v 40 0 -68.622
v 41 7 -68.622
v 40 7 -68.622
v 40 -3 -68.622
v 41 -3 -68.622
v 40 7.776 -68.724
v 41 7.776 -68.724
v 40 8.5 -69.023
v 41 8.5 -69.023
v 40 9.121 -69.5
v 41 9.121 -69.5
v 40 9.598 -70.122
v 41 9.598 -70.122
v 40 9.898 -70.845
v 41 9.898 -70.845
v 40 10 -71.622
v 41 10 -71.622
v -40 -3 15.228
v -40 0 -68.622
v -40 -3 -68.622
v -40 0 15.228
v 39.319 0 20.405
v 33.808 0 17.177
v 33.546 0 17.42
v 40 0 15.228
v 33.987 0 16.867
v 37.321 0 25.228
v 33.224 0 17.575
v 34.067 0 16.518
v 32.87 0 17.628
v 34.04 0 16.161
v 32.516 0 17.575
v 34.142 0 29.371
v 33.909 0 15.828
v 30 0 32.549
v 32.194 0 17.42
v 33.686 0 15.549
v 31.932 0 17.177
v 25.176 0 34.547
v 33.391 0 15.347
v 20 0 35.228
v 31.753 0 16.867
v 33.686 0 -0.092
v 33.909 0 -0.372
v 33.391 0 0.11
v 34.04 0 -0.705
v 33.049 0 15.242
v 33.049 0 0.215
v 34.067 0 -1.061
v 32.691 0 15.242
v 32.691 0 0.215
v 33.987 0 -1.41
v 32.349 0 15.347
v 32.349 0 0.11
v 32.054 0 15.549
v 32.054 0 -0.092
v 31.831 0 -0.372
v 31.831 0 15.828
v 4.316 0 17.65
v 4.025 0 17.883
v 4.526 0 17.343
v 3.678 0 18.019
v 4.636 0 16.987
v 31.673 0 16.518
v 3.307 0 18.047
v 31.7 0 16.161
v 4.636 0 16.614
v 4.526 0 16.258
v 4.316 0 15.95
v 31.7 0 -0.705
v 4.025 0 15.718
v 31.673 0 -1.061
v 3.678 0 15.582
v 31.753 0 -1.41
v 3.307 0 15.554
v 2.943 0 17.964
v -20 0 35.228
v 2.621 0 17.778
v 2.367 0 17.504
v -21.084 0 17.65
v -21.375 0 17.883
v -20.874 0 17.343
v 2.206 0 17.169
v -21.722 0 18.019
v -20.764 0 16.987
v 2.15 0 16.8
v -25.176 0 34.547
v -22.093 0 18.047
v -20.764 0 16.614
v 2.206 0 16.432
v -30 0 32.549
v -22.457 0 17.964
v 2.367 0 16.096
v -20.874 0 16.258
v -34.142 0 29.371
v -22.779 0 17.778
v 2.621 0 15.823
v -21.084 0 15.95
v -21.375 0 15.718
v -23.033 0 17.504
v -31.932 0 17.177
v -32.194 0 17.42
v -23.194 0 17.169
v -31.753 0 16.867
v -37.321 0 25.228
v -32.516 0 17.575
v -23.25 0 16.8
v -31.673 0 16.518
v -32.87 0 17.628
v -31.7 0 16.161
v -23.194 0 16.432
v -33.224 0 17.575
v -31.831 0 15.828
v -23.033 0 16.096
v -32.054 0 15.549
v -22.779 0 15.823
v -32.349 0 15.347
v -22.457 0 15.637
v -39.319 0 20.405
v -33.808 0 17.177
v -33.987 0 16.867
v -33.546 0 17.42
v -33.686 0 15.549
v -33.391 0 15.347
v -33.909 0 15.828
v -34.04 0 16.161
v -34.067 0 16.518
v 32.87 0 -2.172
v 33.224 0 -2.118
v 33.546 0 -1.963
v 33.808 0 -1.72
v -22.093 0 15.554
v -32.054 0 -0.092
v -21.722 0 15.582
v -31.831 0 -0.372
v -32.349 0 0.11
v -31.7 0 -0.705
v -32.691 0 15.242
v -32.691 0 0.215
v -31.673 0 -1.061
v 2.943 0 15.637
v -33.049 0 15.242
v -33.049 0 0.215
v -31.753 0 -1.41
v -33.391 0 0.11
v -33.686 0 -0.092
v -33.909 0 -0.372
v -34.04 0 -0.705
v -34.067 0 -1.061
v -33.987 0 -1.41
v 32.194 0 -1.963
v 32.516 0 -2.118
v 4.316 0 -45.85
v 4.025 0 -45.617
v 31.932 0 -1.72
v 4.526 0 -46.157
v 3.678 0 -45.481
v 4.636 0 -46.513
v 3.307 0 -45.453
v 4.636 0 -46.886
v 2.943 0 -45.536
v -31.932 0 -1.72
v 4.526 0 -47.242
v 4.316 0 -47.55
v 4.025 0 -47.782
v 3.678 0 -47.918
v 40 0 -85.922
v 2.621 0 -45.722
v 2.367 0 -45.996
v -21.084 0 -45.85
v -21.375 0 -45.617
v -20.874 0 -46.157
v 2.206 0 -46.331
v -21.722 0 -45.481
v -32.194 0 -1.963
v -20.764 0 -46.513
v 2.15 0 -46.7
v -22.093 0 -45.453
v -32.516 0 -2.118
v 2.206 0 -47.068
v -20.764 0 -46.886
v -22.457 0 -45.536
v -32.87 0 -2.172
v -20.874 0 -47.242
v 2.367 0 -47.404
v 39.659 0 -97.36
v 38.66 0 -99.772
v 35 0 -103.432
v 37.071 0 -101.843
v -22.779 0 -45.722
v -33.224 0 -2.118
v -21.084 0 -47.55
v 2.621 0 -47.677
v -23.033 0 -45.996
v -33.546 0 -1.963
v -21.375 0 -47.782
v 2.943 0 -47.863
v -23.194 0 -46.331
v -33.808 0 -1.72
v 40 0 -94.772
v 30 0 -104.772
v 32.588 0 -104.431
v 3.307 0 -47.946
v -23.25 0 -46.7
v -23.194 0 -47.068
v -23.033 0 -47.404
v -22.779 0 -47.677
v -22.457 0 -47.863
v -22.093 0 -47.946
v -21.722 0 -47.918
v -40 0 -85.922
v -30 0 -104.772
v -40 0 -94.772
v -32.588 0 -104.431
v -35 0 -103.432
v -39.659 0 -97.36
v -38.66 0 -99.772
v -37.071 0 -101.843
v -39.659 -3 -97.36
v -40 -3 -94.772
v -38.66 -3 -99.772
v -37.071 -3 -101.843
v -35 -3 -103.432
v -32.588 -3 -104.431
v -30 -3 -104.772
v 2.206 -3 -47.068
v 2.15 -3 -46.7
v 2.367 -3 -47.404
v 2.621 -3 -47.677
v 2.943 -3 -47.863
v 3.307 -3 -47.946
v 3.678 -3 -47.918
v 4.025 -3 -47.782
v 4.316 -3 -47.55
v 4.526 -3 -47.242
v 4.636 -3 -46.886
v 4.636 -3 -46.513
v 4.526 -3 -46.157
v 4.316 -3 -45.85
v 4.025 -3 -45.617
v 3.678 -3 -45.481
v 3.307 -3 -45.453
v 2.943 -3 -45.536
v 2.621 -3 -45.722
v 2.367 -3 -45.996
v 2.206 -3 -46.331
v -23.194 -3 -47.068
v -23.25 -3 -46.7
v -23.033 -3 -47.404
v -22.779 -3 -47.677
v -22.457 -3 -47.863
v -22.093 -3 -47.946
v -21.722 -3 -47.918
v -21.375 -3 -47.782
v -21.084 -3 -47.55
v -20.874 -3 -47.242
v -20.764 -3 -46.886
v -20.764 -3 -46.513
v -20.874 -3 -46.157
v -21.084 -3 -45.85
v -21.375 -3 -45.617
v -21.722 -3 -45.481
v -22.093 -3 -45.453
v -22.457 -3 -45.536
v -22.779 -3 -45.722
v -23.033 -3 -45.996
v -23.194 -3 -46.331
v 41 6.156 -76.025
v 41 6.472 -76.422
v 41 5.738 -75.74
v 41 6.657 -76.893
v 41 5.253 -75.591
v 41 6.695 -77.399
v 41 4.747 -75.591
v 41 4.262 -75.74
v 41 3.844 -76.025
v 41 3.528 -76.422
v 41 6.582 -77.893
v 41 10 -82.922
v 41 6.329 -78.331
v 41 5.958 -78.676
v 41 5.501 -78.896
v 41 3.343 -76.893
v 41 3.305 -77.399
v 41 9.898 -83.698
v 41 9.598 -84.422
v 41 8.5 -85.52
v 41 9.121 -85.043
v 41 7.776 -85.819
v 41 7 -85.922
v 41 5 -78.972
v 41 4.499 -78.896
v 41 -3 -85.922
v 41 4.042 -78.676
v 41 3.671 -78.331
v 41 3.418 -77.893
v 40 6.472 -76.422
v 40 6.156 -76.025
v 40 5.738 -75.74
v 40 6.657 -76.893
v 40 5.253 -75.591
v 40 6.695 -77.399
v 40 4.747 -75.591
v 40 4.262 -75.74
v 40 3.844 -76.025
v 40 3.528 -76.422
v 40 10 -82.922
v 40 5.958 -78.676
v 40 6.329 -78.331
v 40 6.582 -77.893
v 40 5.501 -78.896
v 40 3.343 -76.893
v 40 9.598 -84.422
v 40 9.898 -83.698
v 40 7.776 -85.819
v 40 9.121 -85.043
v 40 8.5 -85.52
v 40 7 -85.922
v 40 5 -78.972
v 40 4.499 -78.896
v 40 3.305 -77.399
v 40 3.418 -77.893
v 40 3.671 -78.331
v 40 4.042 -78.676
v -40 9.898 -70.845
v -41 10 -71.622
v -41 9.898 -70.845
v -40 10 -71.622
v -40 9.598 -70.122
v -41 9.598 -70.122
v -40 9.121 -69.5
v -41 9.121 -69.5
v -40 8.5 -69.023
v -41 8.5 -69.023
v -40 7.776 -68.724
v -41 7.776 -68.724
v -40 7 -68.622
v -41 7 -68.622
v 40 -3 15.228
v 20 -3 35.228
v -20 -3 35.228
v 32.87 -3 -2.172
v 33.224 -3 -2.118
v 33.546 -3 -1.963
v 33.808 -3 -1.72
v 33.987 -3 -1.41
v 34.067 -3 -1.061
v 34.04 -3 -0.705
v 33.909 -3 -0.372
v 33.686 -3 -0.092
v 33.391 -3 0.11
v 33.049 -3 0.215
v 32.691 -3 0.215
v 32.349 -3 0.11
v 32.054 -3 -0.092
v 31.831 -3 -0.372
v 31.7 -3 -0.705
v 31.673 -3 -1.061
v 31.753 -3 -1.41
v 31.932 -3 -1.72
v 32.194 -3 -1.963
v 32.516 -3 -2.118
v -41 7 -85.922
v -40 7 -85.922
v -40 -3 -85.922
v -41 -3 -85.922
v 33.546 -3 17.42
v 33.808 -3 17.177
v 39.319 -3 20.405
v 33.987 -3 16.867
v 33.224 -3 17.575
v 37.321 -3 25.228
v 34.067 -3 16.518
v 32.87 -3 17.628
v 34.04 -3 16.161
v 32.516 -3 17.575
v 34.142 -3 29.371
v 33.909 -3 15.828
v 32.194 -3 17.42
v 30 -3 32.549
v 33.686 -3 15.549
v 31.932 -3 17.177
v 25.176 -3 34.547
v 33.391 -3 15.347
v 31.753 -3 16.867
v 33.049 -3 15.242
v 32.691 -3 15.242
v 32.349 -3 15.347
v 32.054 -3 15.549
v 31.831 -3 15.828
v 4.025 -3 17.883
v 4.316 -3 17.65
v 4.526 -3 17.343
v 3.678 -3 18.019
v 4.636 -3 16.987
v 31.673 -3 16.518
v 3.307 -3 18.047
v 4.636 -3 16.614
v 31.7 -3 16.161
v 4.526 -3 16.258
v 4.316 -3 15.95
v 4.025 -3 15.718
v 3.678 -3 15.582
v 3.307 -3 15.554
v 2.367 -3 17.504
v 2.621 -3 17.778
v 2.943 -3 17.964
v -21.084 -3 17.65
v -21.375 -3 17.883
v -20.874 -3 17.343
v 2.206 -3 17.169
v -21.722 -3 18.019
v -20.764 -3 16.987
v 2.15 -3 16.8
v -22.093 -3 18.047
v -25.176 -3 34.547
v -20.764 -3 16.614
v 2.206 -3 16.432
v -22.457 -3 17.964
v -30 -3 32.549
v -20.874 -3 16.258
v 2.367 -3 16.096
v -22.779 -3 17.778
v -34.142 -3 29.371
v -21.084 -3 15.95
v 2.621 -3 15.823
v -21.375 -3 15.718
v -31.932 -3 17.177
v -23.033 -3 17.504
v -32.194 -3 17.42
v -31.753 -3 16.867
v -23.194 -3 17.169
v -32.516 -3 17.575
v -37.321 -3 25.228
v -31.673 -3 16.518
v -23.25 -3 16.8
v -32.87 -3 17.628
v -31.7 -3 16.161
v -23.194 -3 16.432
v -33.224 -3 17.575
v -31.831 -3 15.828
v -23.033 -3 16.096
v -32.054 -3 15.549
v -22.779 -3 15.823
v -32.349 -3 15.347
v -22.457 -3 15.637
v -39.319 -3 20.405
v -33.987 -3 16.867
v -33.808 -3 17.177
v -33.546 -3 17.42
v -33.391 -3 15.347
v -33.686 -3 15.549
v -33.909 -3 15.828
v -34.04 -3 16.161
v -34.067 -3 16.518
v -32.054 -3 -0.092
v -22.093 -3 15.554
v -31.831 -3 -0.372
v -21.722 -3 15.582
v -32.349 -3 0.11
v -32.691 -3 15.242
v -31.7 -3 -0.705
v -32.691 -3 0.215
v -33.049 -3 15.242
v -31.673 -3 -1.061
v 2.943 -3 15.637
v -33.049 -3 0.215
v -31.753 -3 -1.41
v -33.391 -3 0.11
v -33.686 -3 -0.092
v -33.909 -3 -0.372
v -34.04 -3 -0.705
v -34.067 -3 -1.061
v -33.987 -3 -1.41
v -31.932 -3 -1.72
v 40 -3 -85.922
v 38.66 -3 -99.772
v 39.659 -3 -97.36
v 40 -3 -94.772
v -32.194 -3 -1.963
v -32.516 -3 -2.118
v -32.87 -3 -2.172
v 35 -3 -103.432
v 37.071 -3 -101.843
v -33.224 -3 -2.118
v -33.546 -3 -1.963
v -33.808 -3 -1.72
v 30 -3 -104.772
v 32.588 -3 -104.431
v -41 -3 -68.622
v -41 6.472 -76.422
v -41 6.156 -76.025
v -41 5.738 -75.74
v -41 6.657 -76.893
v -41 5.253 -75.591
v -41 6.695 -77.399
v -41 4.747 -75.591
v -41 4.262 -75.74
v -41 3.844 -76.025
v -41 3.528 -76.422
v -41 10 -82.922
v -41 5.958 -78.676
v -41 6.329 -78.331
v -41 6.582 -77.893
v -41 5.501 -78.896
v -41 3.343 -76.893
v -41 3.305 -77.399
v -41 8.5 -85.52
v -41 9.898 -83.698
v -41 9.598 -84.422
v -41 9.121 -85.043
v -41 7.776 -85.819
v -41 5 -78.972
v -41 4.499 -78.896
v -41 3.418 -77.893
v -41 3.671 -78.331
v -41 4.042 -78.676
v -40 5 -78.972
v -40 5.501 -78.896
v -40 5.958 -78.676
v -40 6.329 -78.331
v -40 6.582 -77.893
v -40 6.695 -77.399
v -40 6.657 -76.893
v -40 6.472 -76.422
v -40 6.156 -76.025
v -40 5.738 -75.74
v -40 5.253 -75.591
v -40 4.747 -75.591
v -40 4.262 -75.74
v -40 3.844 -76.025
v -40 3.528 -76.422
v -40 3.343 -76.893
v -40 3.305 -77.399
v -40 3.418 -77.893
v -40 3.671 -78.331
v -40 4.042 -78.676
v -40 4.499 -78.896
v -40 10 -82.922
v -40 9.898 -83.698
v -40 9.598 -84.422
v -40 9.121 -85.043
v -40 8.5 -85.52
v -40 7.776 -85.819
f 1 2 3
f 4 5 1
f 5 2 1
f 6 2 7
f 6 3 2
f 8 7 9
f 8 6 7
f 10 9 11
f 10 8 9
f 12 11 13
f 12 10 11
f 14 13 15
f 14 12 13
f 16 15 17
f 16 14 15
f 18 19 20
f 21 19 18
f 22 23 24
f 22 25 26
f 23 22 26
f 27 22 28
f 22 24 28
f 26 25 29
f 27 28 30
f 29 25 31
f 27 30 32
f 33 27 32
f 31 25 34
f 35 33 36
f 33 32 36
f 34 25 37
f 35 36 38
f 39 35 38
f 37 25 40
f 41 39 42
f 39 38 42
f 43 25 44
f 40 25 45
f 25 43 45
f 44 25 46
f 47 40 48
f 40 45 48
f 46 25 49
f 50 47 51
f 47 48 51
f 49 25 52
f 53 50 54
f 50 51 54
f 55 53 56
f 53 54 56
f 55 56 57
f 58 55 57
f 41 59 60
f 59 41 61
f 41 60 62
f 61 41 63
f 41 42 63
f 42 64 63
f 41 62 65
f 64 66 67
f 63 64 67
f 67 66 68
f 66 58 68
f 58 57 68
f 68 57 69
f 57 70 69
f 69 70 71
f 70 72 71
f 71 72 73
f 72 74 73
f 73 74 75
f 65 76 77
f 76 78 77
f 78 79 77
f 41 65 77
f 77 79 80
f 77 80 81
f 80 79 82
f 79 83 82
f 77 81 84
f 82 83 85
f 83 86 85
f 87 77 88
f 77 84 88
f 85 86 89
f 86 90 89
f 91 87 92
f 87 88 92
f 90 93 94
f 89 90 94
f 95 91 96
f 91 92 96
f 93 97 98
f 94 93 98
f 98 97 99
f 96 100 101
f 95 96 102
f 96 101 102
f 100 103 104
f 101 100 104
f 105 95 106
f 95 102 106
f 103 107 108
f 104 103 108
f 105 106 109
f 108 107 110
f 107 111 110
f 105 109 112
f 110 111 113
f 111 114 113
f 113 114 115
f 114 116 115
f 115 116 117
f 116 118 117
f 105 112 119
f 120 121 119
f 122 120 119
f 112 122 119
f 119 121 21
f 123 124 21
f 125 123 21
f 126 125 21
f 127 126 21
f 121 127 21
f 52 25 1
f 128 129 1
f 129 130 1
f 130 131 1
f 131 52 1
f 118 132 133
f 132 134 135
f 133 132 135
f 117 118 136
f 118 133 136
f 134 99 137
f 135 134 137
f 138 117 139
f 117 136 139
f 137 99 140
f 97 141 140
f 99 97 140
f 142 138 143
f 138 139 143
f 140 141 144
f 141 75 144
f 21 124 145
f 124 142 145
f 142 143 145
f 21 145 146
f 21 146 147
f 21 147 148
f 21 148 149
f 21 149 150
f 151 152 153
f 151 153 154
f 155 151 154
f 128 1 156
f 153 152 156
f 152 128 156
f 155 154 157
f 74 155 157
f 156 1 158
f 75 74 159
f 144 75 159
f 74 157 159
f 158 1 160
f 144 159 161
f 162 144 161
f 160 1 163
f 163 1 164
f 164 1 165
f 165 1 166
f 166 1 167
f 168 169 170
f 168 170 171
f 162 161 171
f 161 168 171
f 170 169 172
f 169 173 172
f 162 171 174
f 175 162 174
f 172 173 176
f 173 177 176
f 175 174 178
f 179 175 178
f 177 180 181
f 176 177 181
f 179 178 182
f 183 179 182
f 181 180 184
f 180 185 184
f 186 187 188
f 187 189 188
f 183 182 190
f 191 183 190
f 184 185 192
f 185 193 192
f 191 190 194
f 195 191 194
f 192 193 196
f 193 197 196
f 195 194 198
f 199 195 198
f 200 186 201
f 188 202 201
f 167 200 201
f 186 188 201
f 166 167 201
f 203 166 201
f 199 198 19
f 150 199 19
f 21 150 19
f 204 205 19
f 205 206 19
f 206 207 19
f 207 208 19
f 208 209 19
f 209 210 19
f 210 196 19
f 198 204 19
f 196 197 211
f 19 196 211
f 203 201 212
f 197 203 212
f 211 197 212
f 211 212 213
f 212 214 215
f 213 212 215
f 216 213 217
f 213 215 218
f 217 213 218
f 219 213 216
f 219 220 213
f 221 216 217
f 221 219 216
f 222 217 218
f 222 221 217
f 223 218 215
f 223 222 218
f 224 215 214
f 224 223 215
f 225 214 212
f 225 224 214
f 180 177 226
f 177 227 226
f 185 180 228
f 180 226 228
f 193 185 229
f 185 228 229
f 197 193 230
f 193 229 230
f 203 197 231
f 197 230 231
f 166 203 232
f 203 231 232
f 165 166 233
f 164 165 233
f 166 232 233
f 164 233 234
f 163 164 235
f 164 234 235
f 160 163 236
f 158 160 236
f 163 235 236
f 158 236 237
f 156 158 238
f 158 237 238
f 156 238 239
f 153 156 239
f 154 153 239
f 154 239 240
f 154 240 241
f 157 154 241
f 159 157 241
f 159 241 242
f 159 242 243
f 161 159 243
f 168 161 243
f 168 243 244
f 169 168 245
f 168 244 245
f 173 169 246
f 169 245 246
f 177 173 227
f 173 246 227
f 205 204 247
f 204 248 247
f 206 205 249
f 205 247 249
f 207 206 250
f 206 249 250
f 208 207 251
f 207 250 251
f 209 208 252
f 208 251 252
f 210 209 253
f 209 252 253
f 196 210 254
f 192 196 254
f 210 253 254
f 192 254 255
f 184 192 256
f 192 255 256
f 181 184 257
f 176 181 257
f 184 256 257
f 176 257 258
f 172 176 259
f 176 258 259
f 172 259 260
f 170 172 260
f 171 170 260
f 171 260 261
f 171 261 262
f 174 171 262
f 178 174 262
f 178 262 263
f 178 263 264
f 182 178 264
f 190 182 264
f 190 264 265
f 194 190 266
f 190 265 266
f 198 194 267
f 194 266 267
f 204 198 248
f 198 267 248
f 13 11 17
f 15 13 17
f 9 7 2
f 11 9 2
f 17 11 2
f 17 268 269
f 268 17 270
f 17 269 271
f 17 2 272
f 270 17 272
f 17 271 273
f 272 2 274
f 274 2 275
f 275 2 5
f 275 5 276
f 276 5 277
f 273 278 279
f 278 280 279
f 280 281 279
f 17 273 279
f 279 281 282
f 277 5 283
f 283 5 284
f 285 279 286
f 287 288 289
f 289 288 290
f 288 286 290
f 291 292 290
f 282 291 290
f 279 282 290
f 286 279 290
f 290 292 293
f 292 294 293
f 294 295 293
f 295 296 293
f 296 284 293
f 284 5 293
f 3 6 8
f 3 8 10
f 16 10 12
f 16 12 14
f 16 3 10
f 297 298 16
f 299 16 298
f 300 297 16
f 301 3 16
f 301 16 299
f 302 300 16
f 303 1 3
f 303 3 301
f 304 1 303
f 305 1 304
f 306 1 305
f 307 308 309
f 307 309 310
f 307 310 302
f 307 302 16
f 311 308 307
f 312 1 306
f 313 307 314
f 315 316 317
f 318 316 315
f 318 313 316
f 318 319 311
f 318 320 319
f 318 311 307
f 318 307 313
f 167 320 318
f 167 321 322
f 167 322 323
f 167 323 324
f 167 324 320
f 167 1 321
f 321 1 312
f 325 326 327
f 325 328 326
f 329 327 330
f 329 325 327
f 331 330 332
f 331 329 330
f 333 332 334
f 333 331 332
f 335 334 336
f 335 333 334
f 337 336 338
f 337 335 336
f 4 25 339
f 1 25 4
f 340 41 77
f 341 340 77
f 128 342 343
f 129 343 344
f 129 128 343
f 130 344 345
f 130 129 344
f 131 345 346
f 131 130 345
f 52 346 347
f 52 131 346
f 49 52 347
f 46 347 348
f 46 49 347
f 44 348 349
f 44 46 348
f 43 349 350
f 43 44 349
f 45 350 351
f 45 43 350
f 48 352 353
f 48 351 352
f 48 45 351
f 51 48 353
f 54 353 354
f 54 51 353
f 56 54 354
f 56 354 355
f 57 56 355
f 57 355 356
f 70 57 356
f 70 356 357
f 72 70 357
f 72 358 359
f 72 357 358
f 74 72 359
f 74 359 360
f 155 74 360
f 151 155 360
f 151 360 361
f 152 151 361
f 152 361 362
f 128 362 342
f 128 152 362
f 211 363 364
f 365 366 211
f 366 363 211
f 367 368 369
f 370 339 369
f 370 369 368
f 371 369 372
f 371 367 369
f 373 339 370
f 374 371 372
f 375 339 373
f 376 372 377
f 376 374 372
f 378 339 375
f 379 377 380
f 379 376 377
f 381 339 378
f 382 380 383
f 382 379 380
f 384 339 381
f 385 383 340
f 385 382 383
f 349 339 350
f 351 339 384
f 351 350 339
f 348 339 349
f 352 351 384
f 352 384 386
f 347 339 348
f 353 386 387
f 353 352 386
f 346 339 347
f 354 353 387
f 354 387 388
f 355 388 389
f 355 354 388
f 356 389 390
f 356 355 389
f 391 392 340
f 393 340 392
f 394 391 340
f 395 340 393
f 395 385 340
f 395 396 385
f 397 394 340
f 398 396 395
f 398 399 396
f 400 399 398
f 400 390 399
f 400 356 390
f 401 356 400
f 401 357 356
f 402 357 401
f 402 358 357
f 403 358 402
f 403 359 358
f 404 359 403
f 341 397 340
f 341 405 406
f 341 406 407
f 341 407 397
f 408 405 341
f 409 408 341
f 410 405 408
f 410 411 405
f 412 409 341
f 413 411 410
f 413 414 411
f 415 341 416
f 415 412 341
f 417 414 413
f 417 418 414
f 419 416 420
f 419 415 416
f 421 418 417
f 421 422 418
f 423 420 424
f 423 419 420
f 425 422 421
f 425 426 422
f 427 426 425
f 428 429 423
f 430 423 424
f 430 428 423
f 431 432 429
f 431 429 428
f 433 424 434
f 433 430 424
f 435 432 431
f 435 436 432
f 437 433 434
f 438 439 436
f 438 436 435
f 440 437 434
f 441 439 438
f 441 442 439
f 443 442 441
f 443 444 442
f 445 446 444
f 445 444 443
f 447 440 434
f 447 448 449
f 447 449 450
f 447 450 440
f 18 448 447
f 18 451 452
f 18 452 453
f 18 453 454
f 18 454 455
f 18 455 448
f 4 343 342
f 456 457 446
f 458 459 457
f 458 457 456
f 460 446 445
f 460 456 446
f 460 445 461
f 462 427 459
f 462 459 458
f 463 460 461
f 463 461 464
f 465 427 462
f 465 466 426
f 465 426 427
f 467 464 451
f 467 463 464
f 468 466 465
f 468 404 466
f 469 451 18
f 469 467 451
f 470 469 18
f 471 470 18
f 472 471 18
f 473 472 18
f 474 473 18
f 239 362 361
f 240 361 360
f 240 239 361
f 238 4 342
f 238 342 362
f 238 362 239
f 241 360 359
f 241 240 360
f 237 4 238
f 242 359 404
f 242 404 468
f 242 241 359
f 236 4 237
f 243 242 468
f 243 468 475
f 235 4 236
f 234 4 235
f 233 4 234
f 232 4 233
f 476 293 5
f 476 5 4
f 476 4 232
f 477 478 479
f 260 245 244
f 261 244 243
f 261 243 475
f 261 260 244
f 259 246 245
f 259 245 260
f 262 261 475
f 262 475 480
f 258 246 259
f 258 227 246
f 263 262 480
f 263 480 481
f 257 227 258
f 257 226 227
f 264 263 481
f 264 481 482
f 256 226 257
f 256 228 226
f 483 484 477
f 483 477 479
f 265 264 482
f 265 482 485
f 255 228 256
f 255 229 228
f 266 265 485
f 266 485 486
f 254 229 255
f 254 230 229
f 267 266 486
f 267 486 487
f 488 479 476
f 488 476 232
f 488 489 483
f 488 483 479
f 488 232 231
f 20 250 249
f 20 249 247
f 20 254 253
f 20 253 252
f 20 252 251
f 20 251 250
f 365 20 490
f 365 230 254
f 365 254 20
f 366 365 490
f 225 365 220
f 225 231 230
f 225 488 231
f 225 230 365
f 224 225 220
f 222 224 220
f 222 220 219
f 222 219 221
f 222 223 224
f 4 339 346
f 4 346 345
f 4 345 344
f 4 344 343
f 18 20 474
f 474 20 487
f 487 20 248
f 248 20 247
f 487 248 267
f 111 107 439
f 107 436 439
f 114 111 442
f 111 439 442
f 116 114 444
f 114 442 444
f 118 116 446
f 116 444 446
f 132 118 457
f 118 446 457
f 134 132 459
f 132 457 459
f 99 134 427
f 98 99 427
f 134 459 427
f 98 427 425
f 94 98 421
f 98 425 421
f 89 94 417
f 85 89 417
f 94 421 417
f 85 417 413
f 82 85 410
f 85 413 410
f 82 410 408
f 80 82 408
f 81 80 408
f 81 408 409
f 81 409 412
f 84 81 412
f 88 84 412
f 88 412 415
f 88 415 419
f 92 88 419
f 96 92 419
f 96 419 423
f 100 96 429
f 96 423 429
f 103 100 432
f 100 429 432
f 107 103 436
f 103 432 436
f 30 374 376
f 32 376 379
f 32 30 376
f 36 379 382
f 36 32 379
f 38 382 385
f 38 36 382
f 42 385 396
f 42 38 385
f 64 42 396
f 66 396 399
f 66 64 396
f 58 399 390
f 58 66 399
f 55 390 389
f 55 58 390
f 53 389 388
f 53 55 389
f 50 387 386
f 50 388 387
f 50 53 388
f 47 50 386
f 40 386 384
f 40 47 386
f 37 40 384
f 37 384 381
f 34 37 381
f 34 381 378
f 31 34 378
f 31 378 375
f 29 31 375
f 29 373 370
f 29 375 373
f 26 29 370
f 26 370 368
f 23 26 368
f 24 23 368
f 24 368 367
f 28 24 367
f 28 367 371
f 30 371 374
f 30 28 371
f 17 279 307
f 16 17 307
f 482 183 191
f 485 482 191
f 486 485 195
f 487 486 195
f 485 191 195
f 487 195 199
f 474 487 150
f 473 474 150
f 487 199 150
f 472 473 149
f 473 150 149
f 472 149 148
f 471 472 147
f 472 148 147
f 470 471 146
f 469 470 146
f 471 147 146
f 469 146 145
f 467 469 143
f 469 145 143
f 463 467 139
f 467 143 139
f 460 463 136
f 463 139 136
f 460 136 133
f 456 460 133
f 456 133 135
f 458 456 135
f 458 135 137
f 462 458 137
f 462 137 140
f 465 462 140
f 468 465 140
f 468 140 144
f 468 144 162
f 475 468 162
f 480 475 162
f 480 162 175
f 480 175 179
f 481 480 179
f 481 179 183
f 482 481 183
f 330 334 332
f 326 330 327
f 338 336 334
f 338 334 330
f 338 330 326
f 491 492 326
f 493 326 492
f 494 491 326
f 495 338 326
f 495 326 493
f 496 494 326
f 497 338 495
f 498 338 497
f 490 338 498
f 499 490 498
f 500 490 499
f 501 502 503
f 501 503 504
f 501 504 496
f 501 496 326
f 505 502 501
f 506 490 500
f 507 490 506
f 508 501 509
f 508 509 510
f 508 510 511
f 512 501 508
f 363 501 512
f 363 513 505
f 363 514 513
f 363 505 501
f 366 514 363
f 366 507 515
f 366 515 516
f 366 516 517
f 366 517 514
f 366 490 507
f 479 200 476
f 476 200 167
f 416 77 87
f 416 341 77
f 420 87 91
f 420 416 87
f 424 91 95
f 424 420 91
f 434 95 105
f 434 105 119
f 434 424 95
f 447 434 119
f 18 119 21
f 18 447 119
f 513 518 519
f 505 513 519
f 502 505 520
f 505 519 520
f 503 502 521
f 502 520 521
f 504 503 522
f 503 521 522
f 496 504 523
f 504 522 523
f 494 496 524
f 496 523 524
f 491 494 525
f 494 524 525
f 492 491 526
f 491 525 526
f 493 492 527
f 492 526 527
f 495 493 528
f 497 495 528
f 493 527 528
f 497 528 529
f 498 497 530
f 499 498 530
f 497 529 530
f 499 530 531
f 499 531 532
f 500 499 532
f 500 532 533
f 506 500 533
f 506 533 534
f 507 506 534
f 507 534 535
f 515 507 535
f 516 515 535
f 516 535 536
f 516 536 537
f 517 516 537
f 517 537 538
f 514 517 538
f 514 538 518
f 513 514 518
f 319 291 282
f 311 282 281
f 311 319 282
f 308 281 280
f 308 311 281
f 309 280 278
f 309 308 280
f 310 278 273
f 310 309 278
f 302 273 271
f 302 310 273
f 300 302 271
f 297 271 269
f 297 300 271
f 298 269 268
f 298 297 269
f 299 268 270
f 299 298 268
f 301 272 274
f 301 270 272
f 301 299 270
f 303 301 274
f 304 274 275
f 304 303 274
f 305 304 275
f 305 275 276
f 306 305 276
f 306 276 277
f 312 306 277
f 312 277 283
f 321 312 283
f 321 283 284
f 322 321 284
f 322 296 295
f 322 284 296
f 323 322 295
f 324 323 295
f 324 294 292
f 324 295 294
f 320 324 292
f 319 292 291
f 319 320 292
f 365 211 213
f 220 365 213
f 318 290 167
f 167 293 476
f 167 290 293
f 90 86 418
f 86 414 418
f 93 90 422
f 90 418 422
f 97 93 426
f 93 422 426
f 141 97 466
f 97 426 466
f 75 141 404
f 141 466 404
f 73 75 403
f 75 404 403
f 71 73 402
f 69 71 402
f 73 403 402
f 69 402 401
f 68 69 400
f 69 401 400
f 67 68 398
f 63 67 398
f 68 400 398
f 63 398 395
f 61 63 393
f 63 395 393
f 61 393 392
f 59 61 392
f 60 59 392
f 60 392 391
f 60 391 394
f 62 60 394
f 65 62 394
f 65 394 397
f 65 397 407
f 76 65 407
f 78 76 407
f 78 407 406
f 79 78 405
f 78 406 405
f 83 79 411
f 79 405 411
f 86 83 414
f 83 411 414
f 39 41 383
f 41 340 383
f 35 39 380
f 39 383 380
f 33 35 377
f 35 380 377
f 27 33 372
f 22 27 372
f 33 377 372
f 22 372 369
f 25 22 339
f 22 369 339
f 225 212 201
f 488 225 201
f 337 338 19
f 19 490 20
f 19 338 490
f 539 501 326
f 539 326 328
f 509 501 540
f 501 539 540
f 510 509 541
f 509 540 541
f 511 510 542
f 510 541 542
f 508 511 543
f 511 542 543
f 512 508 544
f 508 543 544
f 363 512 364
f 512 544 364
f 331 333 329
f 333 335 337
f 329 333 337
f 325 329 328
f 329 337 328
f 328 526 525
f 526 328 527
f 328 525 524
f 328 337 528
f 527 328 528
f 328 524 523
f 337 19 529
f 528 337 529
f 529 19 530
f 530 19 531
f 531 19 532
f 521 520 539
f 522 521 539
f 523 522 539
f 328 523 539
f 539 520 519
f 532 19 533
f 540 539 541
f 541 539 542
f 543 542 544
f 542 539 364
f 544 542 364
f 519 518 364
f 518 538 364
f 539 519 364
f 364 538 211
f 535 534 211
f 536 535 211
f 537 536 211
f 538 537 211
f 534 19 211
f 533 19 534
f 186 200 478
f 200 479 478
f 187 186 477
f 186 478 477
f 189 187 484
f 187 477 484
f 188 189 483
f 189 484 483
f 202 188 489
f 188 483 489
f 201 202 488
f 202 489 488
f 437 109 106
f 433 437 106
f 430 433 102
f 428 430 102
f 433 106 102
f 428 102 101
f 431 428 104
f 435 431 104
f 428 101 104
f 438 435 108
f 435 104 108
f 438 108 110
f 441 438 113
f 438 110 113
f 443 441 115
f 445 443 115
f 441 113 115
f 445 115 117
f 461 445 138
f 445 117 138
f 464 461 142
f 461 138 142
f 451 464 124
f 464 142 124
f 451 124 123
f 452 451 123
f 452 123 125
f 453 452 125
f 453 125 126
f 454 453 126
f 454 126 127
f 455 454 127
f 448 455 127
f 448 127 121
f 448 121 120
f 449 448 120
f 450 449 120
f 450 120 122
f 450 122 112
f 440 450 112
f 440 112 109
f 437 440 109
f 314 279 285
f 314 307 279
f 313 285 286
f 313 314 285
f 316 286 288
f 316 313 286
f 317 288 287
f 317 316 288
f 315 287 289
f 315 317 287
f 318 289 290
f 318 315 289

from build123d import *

# Parameters (mm, degrees)
EXTRUDE_1_DEPTH        = 3
FILLET_1_R             = 20
FILLET_2_R             = 20
FILLET_3_R             = 10
SKETCH_2_R             = 1.2
CUT_EXTRUDE_1_DEPTH    = 113.548094016
SKETCH_5_W             = 1
SKETCH_5_H             = 17.3
EXTRUDE_2_DEPTH        = 10
SKETCH_7_R             = 1.7
CUT_EXTRUDE_2_DEPTH    = 133.80840887
FILLET_4_R             = 3
FILLET_4_OF_MIRROR_3_R = 3
HOLE_WIZARD_M3_1_D     = 2.5
HOLE_WIZARD_M3_1_DEPTH = 3
HOLE_WIZARD_M3_1_TIP   = 0.751075774


with BuildPart() as part:
    # 스케치1 → 보스-돌출1 (new body)
    with BuildSketch(Plane(origin=(0, 0, 0), x_dir=(1, 0, 0), z_dir=(0, 1, 0))):
        Polygon((40, -35.228470152), (-40, -35.228470152), (-40, -16.378470152), (-40, 68.621529848), (-41, 68.621529848), (-41, 85.921529848), (-40, 85.921529848), (-40, 104.771529848), (40, 104.771529848), (40, 85.921529848), (41, 85.921529848), (41, 68.621529848), (40, 68.621529848), (40, -16.378470152), align=None)
    extrude(amount=-EXTRUDE_1_DEPTH)

    # 필렛1
    fillet_1_edges = [part.edges().sort_by_distance(p)[0] for p in [
        (-40, -1.5, 35.228470152),
    ]]
    fillet(fillet_1_edges, radius=FILLET_1_R)

    # 필렛2
    fillet_2_edges = [part.edges().sort_by_distance(p)[0] for p in [
        (40, -1.5, 35.228470152),
    ]]
    fillet(fillet_2_edges, radius=FILLET_2_R)

    # 필렛3
    fillet_3_edges = [part.edges().sort_by_distance(p)[0] for p in [
        (-40, -1.5, -104.771529848),
        (40, -1.5, -104.771529848),
    ]]
    fillet(fillet_3_edges, radius=FILLET_3_R)

    # 스케치2 → 컷-돌출1 (cut, through all)
    with BuildSketch(Plane(origin=(0, 0, 0), x_dir=(1, 0, 0), z_dir=(0, 1, 0))):
        with Locations(Location((-32.87, -16.428470152, 0), (0, 0, 270))):
            Circle(SKETCH_2_R)
        with Locations(Location((-32.87, 0.971529848, 0), (0, 0, 90))):
            Circle(SKETCH_2_R)
    cut_extrude_1 = extrude(amount=-CUT_EXTRUDE_1_DEPTH, mode=Mode.SUBTRACT)

    # 대칭 복사1: 컷-돌출1 across plane
    add(cut_extrude_1.mirror(Plane(origin=(0, 0, 0), x_dir=(0, 0, 1), z_dir=(1, 0, 0))), mode=Mode.SUBTRACT)

    # 스케치5 → 보스-돌출2 (add)
    with BuildSketch(Plane(origin=(0, 0, 0), x_dir=(1, 0, 0), z_dir=(0, 1, 0))):
        with Locations((-40.5, 77.271529848)):
            Rectangle(SKETCH_5_W, SKETCH_5_H)
    extrude_2 = extrude(amount=EXTRUDE_2_DEPTH)

    # 스케치7 → 컷-돌출2 (cut, through all)
    with BuildSketch(Plane(origin=(-40, 0, 0), x_dir=(0, 0, -1), z_dir=(1, 0, 0))):
        with Locations((77.271529848, 5)):
            Circle(SKETCH_7_R)
    cut_extrude_2 = extrude(amount=-CUT_EXTRUDE_2_DEPTH, mode=Mode.SUBTRACT)

    # 필렛4
    fillet_4_edges = [part.edges().sort_by_distance(p)[0] for p in [
        (-40.5, 10, -68.621529848),
        (-40.5, 10, -85.921529848),
    ]]
    fillet(fillet_4_edges, radius=FILLET_4_R)

    # 대칭 복사3: 보스-돌출2, 컷-돌출2 across plane
    add(extrude_2.mirror(Plane(origin=(0, 0, 0), x_dir=(0, 0, 1), z_dir=(1, 0, 0))))
    add(cut_extrude_2.mirror(Plane(origin=(0, 0, 0), x_dir=(0, 0, 1), z_dir=(1, 0, 0))), mode=Mode.SUBTRACT)

    # 필렛4 of 대칭 복사3
    fillet_4_of_mirror_3_edges = [part.edges().sort_by_distance(p)[0] for p in [
        (40.5, 10, -68.621529848),
        (40.5, 10, -85.921529848),
    ]]
    fillet(fillet_4_of_mirror_3_edges, radius=FILLET_4_OF_MIRROR_3_R)

    # M3 탭을 위한 탭 드릴1
    with Locations(Plane(origin=(0, 0, 0), x_dir=(1, 0, 0), z_dir=(0, 1, 0))):
        with Locations((-22, -16.800227959), (3.4, -16.800227959), (3.4, 46.699772041), (-22, 46.699772041)):
            Hole(HOLE_WIZARD_M3_1_D / 2, depth=HOLE_WIZARD_M3_1_DEPTH)
            with Locations((0, 0, -(HOLE_WIZARD_M3_1_DEPTH + HOLE_WIZARD_M3_1_TIP / 2))):  # 118° drill point
                Cone(0, HOLE_WIZARD_M3_1_D / 2, HOLE_WIZARD_M3_1_TIP, mode=Mode.SUBTRACT)


solid = part.part
